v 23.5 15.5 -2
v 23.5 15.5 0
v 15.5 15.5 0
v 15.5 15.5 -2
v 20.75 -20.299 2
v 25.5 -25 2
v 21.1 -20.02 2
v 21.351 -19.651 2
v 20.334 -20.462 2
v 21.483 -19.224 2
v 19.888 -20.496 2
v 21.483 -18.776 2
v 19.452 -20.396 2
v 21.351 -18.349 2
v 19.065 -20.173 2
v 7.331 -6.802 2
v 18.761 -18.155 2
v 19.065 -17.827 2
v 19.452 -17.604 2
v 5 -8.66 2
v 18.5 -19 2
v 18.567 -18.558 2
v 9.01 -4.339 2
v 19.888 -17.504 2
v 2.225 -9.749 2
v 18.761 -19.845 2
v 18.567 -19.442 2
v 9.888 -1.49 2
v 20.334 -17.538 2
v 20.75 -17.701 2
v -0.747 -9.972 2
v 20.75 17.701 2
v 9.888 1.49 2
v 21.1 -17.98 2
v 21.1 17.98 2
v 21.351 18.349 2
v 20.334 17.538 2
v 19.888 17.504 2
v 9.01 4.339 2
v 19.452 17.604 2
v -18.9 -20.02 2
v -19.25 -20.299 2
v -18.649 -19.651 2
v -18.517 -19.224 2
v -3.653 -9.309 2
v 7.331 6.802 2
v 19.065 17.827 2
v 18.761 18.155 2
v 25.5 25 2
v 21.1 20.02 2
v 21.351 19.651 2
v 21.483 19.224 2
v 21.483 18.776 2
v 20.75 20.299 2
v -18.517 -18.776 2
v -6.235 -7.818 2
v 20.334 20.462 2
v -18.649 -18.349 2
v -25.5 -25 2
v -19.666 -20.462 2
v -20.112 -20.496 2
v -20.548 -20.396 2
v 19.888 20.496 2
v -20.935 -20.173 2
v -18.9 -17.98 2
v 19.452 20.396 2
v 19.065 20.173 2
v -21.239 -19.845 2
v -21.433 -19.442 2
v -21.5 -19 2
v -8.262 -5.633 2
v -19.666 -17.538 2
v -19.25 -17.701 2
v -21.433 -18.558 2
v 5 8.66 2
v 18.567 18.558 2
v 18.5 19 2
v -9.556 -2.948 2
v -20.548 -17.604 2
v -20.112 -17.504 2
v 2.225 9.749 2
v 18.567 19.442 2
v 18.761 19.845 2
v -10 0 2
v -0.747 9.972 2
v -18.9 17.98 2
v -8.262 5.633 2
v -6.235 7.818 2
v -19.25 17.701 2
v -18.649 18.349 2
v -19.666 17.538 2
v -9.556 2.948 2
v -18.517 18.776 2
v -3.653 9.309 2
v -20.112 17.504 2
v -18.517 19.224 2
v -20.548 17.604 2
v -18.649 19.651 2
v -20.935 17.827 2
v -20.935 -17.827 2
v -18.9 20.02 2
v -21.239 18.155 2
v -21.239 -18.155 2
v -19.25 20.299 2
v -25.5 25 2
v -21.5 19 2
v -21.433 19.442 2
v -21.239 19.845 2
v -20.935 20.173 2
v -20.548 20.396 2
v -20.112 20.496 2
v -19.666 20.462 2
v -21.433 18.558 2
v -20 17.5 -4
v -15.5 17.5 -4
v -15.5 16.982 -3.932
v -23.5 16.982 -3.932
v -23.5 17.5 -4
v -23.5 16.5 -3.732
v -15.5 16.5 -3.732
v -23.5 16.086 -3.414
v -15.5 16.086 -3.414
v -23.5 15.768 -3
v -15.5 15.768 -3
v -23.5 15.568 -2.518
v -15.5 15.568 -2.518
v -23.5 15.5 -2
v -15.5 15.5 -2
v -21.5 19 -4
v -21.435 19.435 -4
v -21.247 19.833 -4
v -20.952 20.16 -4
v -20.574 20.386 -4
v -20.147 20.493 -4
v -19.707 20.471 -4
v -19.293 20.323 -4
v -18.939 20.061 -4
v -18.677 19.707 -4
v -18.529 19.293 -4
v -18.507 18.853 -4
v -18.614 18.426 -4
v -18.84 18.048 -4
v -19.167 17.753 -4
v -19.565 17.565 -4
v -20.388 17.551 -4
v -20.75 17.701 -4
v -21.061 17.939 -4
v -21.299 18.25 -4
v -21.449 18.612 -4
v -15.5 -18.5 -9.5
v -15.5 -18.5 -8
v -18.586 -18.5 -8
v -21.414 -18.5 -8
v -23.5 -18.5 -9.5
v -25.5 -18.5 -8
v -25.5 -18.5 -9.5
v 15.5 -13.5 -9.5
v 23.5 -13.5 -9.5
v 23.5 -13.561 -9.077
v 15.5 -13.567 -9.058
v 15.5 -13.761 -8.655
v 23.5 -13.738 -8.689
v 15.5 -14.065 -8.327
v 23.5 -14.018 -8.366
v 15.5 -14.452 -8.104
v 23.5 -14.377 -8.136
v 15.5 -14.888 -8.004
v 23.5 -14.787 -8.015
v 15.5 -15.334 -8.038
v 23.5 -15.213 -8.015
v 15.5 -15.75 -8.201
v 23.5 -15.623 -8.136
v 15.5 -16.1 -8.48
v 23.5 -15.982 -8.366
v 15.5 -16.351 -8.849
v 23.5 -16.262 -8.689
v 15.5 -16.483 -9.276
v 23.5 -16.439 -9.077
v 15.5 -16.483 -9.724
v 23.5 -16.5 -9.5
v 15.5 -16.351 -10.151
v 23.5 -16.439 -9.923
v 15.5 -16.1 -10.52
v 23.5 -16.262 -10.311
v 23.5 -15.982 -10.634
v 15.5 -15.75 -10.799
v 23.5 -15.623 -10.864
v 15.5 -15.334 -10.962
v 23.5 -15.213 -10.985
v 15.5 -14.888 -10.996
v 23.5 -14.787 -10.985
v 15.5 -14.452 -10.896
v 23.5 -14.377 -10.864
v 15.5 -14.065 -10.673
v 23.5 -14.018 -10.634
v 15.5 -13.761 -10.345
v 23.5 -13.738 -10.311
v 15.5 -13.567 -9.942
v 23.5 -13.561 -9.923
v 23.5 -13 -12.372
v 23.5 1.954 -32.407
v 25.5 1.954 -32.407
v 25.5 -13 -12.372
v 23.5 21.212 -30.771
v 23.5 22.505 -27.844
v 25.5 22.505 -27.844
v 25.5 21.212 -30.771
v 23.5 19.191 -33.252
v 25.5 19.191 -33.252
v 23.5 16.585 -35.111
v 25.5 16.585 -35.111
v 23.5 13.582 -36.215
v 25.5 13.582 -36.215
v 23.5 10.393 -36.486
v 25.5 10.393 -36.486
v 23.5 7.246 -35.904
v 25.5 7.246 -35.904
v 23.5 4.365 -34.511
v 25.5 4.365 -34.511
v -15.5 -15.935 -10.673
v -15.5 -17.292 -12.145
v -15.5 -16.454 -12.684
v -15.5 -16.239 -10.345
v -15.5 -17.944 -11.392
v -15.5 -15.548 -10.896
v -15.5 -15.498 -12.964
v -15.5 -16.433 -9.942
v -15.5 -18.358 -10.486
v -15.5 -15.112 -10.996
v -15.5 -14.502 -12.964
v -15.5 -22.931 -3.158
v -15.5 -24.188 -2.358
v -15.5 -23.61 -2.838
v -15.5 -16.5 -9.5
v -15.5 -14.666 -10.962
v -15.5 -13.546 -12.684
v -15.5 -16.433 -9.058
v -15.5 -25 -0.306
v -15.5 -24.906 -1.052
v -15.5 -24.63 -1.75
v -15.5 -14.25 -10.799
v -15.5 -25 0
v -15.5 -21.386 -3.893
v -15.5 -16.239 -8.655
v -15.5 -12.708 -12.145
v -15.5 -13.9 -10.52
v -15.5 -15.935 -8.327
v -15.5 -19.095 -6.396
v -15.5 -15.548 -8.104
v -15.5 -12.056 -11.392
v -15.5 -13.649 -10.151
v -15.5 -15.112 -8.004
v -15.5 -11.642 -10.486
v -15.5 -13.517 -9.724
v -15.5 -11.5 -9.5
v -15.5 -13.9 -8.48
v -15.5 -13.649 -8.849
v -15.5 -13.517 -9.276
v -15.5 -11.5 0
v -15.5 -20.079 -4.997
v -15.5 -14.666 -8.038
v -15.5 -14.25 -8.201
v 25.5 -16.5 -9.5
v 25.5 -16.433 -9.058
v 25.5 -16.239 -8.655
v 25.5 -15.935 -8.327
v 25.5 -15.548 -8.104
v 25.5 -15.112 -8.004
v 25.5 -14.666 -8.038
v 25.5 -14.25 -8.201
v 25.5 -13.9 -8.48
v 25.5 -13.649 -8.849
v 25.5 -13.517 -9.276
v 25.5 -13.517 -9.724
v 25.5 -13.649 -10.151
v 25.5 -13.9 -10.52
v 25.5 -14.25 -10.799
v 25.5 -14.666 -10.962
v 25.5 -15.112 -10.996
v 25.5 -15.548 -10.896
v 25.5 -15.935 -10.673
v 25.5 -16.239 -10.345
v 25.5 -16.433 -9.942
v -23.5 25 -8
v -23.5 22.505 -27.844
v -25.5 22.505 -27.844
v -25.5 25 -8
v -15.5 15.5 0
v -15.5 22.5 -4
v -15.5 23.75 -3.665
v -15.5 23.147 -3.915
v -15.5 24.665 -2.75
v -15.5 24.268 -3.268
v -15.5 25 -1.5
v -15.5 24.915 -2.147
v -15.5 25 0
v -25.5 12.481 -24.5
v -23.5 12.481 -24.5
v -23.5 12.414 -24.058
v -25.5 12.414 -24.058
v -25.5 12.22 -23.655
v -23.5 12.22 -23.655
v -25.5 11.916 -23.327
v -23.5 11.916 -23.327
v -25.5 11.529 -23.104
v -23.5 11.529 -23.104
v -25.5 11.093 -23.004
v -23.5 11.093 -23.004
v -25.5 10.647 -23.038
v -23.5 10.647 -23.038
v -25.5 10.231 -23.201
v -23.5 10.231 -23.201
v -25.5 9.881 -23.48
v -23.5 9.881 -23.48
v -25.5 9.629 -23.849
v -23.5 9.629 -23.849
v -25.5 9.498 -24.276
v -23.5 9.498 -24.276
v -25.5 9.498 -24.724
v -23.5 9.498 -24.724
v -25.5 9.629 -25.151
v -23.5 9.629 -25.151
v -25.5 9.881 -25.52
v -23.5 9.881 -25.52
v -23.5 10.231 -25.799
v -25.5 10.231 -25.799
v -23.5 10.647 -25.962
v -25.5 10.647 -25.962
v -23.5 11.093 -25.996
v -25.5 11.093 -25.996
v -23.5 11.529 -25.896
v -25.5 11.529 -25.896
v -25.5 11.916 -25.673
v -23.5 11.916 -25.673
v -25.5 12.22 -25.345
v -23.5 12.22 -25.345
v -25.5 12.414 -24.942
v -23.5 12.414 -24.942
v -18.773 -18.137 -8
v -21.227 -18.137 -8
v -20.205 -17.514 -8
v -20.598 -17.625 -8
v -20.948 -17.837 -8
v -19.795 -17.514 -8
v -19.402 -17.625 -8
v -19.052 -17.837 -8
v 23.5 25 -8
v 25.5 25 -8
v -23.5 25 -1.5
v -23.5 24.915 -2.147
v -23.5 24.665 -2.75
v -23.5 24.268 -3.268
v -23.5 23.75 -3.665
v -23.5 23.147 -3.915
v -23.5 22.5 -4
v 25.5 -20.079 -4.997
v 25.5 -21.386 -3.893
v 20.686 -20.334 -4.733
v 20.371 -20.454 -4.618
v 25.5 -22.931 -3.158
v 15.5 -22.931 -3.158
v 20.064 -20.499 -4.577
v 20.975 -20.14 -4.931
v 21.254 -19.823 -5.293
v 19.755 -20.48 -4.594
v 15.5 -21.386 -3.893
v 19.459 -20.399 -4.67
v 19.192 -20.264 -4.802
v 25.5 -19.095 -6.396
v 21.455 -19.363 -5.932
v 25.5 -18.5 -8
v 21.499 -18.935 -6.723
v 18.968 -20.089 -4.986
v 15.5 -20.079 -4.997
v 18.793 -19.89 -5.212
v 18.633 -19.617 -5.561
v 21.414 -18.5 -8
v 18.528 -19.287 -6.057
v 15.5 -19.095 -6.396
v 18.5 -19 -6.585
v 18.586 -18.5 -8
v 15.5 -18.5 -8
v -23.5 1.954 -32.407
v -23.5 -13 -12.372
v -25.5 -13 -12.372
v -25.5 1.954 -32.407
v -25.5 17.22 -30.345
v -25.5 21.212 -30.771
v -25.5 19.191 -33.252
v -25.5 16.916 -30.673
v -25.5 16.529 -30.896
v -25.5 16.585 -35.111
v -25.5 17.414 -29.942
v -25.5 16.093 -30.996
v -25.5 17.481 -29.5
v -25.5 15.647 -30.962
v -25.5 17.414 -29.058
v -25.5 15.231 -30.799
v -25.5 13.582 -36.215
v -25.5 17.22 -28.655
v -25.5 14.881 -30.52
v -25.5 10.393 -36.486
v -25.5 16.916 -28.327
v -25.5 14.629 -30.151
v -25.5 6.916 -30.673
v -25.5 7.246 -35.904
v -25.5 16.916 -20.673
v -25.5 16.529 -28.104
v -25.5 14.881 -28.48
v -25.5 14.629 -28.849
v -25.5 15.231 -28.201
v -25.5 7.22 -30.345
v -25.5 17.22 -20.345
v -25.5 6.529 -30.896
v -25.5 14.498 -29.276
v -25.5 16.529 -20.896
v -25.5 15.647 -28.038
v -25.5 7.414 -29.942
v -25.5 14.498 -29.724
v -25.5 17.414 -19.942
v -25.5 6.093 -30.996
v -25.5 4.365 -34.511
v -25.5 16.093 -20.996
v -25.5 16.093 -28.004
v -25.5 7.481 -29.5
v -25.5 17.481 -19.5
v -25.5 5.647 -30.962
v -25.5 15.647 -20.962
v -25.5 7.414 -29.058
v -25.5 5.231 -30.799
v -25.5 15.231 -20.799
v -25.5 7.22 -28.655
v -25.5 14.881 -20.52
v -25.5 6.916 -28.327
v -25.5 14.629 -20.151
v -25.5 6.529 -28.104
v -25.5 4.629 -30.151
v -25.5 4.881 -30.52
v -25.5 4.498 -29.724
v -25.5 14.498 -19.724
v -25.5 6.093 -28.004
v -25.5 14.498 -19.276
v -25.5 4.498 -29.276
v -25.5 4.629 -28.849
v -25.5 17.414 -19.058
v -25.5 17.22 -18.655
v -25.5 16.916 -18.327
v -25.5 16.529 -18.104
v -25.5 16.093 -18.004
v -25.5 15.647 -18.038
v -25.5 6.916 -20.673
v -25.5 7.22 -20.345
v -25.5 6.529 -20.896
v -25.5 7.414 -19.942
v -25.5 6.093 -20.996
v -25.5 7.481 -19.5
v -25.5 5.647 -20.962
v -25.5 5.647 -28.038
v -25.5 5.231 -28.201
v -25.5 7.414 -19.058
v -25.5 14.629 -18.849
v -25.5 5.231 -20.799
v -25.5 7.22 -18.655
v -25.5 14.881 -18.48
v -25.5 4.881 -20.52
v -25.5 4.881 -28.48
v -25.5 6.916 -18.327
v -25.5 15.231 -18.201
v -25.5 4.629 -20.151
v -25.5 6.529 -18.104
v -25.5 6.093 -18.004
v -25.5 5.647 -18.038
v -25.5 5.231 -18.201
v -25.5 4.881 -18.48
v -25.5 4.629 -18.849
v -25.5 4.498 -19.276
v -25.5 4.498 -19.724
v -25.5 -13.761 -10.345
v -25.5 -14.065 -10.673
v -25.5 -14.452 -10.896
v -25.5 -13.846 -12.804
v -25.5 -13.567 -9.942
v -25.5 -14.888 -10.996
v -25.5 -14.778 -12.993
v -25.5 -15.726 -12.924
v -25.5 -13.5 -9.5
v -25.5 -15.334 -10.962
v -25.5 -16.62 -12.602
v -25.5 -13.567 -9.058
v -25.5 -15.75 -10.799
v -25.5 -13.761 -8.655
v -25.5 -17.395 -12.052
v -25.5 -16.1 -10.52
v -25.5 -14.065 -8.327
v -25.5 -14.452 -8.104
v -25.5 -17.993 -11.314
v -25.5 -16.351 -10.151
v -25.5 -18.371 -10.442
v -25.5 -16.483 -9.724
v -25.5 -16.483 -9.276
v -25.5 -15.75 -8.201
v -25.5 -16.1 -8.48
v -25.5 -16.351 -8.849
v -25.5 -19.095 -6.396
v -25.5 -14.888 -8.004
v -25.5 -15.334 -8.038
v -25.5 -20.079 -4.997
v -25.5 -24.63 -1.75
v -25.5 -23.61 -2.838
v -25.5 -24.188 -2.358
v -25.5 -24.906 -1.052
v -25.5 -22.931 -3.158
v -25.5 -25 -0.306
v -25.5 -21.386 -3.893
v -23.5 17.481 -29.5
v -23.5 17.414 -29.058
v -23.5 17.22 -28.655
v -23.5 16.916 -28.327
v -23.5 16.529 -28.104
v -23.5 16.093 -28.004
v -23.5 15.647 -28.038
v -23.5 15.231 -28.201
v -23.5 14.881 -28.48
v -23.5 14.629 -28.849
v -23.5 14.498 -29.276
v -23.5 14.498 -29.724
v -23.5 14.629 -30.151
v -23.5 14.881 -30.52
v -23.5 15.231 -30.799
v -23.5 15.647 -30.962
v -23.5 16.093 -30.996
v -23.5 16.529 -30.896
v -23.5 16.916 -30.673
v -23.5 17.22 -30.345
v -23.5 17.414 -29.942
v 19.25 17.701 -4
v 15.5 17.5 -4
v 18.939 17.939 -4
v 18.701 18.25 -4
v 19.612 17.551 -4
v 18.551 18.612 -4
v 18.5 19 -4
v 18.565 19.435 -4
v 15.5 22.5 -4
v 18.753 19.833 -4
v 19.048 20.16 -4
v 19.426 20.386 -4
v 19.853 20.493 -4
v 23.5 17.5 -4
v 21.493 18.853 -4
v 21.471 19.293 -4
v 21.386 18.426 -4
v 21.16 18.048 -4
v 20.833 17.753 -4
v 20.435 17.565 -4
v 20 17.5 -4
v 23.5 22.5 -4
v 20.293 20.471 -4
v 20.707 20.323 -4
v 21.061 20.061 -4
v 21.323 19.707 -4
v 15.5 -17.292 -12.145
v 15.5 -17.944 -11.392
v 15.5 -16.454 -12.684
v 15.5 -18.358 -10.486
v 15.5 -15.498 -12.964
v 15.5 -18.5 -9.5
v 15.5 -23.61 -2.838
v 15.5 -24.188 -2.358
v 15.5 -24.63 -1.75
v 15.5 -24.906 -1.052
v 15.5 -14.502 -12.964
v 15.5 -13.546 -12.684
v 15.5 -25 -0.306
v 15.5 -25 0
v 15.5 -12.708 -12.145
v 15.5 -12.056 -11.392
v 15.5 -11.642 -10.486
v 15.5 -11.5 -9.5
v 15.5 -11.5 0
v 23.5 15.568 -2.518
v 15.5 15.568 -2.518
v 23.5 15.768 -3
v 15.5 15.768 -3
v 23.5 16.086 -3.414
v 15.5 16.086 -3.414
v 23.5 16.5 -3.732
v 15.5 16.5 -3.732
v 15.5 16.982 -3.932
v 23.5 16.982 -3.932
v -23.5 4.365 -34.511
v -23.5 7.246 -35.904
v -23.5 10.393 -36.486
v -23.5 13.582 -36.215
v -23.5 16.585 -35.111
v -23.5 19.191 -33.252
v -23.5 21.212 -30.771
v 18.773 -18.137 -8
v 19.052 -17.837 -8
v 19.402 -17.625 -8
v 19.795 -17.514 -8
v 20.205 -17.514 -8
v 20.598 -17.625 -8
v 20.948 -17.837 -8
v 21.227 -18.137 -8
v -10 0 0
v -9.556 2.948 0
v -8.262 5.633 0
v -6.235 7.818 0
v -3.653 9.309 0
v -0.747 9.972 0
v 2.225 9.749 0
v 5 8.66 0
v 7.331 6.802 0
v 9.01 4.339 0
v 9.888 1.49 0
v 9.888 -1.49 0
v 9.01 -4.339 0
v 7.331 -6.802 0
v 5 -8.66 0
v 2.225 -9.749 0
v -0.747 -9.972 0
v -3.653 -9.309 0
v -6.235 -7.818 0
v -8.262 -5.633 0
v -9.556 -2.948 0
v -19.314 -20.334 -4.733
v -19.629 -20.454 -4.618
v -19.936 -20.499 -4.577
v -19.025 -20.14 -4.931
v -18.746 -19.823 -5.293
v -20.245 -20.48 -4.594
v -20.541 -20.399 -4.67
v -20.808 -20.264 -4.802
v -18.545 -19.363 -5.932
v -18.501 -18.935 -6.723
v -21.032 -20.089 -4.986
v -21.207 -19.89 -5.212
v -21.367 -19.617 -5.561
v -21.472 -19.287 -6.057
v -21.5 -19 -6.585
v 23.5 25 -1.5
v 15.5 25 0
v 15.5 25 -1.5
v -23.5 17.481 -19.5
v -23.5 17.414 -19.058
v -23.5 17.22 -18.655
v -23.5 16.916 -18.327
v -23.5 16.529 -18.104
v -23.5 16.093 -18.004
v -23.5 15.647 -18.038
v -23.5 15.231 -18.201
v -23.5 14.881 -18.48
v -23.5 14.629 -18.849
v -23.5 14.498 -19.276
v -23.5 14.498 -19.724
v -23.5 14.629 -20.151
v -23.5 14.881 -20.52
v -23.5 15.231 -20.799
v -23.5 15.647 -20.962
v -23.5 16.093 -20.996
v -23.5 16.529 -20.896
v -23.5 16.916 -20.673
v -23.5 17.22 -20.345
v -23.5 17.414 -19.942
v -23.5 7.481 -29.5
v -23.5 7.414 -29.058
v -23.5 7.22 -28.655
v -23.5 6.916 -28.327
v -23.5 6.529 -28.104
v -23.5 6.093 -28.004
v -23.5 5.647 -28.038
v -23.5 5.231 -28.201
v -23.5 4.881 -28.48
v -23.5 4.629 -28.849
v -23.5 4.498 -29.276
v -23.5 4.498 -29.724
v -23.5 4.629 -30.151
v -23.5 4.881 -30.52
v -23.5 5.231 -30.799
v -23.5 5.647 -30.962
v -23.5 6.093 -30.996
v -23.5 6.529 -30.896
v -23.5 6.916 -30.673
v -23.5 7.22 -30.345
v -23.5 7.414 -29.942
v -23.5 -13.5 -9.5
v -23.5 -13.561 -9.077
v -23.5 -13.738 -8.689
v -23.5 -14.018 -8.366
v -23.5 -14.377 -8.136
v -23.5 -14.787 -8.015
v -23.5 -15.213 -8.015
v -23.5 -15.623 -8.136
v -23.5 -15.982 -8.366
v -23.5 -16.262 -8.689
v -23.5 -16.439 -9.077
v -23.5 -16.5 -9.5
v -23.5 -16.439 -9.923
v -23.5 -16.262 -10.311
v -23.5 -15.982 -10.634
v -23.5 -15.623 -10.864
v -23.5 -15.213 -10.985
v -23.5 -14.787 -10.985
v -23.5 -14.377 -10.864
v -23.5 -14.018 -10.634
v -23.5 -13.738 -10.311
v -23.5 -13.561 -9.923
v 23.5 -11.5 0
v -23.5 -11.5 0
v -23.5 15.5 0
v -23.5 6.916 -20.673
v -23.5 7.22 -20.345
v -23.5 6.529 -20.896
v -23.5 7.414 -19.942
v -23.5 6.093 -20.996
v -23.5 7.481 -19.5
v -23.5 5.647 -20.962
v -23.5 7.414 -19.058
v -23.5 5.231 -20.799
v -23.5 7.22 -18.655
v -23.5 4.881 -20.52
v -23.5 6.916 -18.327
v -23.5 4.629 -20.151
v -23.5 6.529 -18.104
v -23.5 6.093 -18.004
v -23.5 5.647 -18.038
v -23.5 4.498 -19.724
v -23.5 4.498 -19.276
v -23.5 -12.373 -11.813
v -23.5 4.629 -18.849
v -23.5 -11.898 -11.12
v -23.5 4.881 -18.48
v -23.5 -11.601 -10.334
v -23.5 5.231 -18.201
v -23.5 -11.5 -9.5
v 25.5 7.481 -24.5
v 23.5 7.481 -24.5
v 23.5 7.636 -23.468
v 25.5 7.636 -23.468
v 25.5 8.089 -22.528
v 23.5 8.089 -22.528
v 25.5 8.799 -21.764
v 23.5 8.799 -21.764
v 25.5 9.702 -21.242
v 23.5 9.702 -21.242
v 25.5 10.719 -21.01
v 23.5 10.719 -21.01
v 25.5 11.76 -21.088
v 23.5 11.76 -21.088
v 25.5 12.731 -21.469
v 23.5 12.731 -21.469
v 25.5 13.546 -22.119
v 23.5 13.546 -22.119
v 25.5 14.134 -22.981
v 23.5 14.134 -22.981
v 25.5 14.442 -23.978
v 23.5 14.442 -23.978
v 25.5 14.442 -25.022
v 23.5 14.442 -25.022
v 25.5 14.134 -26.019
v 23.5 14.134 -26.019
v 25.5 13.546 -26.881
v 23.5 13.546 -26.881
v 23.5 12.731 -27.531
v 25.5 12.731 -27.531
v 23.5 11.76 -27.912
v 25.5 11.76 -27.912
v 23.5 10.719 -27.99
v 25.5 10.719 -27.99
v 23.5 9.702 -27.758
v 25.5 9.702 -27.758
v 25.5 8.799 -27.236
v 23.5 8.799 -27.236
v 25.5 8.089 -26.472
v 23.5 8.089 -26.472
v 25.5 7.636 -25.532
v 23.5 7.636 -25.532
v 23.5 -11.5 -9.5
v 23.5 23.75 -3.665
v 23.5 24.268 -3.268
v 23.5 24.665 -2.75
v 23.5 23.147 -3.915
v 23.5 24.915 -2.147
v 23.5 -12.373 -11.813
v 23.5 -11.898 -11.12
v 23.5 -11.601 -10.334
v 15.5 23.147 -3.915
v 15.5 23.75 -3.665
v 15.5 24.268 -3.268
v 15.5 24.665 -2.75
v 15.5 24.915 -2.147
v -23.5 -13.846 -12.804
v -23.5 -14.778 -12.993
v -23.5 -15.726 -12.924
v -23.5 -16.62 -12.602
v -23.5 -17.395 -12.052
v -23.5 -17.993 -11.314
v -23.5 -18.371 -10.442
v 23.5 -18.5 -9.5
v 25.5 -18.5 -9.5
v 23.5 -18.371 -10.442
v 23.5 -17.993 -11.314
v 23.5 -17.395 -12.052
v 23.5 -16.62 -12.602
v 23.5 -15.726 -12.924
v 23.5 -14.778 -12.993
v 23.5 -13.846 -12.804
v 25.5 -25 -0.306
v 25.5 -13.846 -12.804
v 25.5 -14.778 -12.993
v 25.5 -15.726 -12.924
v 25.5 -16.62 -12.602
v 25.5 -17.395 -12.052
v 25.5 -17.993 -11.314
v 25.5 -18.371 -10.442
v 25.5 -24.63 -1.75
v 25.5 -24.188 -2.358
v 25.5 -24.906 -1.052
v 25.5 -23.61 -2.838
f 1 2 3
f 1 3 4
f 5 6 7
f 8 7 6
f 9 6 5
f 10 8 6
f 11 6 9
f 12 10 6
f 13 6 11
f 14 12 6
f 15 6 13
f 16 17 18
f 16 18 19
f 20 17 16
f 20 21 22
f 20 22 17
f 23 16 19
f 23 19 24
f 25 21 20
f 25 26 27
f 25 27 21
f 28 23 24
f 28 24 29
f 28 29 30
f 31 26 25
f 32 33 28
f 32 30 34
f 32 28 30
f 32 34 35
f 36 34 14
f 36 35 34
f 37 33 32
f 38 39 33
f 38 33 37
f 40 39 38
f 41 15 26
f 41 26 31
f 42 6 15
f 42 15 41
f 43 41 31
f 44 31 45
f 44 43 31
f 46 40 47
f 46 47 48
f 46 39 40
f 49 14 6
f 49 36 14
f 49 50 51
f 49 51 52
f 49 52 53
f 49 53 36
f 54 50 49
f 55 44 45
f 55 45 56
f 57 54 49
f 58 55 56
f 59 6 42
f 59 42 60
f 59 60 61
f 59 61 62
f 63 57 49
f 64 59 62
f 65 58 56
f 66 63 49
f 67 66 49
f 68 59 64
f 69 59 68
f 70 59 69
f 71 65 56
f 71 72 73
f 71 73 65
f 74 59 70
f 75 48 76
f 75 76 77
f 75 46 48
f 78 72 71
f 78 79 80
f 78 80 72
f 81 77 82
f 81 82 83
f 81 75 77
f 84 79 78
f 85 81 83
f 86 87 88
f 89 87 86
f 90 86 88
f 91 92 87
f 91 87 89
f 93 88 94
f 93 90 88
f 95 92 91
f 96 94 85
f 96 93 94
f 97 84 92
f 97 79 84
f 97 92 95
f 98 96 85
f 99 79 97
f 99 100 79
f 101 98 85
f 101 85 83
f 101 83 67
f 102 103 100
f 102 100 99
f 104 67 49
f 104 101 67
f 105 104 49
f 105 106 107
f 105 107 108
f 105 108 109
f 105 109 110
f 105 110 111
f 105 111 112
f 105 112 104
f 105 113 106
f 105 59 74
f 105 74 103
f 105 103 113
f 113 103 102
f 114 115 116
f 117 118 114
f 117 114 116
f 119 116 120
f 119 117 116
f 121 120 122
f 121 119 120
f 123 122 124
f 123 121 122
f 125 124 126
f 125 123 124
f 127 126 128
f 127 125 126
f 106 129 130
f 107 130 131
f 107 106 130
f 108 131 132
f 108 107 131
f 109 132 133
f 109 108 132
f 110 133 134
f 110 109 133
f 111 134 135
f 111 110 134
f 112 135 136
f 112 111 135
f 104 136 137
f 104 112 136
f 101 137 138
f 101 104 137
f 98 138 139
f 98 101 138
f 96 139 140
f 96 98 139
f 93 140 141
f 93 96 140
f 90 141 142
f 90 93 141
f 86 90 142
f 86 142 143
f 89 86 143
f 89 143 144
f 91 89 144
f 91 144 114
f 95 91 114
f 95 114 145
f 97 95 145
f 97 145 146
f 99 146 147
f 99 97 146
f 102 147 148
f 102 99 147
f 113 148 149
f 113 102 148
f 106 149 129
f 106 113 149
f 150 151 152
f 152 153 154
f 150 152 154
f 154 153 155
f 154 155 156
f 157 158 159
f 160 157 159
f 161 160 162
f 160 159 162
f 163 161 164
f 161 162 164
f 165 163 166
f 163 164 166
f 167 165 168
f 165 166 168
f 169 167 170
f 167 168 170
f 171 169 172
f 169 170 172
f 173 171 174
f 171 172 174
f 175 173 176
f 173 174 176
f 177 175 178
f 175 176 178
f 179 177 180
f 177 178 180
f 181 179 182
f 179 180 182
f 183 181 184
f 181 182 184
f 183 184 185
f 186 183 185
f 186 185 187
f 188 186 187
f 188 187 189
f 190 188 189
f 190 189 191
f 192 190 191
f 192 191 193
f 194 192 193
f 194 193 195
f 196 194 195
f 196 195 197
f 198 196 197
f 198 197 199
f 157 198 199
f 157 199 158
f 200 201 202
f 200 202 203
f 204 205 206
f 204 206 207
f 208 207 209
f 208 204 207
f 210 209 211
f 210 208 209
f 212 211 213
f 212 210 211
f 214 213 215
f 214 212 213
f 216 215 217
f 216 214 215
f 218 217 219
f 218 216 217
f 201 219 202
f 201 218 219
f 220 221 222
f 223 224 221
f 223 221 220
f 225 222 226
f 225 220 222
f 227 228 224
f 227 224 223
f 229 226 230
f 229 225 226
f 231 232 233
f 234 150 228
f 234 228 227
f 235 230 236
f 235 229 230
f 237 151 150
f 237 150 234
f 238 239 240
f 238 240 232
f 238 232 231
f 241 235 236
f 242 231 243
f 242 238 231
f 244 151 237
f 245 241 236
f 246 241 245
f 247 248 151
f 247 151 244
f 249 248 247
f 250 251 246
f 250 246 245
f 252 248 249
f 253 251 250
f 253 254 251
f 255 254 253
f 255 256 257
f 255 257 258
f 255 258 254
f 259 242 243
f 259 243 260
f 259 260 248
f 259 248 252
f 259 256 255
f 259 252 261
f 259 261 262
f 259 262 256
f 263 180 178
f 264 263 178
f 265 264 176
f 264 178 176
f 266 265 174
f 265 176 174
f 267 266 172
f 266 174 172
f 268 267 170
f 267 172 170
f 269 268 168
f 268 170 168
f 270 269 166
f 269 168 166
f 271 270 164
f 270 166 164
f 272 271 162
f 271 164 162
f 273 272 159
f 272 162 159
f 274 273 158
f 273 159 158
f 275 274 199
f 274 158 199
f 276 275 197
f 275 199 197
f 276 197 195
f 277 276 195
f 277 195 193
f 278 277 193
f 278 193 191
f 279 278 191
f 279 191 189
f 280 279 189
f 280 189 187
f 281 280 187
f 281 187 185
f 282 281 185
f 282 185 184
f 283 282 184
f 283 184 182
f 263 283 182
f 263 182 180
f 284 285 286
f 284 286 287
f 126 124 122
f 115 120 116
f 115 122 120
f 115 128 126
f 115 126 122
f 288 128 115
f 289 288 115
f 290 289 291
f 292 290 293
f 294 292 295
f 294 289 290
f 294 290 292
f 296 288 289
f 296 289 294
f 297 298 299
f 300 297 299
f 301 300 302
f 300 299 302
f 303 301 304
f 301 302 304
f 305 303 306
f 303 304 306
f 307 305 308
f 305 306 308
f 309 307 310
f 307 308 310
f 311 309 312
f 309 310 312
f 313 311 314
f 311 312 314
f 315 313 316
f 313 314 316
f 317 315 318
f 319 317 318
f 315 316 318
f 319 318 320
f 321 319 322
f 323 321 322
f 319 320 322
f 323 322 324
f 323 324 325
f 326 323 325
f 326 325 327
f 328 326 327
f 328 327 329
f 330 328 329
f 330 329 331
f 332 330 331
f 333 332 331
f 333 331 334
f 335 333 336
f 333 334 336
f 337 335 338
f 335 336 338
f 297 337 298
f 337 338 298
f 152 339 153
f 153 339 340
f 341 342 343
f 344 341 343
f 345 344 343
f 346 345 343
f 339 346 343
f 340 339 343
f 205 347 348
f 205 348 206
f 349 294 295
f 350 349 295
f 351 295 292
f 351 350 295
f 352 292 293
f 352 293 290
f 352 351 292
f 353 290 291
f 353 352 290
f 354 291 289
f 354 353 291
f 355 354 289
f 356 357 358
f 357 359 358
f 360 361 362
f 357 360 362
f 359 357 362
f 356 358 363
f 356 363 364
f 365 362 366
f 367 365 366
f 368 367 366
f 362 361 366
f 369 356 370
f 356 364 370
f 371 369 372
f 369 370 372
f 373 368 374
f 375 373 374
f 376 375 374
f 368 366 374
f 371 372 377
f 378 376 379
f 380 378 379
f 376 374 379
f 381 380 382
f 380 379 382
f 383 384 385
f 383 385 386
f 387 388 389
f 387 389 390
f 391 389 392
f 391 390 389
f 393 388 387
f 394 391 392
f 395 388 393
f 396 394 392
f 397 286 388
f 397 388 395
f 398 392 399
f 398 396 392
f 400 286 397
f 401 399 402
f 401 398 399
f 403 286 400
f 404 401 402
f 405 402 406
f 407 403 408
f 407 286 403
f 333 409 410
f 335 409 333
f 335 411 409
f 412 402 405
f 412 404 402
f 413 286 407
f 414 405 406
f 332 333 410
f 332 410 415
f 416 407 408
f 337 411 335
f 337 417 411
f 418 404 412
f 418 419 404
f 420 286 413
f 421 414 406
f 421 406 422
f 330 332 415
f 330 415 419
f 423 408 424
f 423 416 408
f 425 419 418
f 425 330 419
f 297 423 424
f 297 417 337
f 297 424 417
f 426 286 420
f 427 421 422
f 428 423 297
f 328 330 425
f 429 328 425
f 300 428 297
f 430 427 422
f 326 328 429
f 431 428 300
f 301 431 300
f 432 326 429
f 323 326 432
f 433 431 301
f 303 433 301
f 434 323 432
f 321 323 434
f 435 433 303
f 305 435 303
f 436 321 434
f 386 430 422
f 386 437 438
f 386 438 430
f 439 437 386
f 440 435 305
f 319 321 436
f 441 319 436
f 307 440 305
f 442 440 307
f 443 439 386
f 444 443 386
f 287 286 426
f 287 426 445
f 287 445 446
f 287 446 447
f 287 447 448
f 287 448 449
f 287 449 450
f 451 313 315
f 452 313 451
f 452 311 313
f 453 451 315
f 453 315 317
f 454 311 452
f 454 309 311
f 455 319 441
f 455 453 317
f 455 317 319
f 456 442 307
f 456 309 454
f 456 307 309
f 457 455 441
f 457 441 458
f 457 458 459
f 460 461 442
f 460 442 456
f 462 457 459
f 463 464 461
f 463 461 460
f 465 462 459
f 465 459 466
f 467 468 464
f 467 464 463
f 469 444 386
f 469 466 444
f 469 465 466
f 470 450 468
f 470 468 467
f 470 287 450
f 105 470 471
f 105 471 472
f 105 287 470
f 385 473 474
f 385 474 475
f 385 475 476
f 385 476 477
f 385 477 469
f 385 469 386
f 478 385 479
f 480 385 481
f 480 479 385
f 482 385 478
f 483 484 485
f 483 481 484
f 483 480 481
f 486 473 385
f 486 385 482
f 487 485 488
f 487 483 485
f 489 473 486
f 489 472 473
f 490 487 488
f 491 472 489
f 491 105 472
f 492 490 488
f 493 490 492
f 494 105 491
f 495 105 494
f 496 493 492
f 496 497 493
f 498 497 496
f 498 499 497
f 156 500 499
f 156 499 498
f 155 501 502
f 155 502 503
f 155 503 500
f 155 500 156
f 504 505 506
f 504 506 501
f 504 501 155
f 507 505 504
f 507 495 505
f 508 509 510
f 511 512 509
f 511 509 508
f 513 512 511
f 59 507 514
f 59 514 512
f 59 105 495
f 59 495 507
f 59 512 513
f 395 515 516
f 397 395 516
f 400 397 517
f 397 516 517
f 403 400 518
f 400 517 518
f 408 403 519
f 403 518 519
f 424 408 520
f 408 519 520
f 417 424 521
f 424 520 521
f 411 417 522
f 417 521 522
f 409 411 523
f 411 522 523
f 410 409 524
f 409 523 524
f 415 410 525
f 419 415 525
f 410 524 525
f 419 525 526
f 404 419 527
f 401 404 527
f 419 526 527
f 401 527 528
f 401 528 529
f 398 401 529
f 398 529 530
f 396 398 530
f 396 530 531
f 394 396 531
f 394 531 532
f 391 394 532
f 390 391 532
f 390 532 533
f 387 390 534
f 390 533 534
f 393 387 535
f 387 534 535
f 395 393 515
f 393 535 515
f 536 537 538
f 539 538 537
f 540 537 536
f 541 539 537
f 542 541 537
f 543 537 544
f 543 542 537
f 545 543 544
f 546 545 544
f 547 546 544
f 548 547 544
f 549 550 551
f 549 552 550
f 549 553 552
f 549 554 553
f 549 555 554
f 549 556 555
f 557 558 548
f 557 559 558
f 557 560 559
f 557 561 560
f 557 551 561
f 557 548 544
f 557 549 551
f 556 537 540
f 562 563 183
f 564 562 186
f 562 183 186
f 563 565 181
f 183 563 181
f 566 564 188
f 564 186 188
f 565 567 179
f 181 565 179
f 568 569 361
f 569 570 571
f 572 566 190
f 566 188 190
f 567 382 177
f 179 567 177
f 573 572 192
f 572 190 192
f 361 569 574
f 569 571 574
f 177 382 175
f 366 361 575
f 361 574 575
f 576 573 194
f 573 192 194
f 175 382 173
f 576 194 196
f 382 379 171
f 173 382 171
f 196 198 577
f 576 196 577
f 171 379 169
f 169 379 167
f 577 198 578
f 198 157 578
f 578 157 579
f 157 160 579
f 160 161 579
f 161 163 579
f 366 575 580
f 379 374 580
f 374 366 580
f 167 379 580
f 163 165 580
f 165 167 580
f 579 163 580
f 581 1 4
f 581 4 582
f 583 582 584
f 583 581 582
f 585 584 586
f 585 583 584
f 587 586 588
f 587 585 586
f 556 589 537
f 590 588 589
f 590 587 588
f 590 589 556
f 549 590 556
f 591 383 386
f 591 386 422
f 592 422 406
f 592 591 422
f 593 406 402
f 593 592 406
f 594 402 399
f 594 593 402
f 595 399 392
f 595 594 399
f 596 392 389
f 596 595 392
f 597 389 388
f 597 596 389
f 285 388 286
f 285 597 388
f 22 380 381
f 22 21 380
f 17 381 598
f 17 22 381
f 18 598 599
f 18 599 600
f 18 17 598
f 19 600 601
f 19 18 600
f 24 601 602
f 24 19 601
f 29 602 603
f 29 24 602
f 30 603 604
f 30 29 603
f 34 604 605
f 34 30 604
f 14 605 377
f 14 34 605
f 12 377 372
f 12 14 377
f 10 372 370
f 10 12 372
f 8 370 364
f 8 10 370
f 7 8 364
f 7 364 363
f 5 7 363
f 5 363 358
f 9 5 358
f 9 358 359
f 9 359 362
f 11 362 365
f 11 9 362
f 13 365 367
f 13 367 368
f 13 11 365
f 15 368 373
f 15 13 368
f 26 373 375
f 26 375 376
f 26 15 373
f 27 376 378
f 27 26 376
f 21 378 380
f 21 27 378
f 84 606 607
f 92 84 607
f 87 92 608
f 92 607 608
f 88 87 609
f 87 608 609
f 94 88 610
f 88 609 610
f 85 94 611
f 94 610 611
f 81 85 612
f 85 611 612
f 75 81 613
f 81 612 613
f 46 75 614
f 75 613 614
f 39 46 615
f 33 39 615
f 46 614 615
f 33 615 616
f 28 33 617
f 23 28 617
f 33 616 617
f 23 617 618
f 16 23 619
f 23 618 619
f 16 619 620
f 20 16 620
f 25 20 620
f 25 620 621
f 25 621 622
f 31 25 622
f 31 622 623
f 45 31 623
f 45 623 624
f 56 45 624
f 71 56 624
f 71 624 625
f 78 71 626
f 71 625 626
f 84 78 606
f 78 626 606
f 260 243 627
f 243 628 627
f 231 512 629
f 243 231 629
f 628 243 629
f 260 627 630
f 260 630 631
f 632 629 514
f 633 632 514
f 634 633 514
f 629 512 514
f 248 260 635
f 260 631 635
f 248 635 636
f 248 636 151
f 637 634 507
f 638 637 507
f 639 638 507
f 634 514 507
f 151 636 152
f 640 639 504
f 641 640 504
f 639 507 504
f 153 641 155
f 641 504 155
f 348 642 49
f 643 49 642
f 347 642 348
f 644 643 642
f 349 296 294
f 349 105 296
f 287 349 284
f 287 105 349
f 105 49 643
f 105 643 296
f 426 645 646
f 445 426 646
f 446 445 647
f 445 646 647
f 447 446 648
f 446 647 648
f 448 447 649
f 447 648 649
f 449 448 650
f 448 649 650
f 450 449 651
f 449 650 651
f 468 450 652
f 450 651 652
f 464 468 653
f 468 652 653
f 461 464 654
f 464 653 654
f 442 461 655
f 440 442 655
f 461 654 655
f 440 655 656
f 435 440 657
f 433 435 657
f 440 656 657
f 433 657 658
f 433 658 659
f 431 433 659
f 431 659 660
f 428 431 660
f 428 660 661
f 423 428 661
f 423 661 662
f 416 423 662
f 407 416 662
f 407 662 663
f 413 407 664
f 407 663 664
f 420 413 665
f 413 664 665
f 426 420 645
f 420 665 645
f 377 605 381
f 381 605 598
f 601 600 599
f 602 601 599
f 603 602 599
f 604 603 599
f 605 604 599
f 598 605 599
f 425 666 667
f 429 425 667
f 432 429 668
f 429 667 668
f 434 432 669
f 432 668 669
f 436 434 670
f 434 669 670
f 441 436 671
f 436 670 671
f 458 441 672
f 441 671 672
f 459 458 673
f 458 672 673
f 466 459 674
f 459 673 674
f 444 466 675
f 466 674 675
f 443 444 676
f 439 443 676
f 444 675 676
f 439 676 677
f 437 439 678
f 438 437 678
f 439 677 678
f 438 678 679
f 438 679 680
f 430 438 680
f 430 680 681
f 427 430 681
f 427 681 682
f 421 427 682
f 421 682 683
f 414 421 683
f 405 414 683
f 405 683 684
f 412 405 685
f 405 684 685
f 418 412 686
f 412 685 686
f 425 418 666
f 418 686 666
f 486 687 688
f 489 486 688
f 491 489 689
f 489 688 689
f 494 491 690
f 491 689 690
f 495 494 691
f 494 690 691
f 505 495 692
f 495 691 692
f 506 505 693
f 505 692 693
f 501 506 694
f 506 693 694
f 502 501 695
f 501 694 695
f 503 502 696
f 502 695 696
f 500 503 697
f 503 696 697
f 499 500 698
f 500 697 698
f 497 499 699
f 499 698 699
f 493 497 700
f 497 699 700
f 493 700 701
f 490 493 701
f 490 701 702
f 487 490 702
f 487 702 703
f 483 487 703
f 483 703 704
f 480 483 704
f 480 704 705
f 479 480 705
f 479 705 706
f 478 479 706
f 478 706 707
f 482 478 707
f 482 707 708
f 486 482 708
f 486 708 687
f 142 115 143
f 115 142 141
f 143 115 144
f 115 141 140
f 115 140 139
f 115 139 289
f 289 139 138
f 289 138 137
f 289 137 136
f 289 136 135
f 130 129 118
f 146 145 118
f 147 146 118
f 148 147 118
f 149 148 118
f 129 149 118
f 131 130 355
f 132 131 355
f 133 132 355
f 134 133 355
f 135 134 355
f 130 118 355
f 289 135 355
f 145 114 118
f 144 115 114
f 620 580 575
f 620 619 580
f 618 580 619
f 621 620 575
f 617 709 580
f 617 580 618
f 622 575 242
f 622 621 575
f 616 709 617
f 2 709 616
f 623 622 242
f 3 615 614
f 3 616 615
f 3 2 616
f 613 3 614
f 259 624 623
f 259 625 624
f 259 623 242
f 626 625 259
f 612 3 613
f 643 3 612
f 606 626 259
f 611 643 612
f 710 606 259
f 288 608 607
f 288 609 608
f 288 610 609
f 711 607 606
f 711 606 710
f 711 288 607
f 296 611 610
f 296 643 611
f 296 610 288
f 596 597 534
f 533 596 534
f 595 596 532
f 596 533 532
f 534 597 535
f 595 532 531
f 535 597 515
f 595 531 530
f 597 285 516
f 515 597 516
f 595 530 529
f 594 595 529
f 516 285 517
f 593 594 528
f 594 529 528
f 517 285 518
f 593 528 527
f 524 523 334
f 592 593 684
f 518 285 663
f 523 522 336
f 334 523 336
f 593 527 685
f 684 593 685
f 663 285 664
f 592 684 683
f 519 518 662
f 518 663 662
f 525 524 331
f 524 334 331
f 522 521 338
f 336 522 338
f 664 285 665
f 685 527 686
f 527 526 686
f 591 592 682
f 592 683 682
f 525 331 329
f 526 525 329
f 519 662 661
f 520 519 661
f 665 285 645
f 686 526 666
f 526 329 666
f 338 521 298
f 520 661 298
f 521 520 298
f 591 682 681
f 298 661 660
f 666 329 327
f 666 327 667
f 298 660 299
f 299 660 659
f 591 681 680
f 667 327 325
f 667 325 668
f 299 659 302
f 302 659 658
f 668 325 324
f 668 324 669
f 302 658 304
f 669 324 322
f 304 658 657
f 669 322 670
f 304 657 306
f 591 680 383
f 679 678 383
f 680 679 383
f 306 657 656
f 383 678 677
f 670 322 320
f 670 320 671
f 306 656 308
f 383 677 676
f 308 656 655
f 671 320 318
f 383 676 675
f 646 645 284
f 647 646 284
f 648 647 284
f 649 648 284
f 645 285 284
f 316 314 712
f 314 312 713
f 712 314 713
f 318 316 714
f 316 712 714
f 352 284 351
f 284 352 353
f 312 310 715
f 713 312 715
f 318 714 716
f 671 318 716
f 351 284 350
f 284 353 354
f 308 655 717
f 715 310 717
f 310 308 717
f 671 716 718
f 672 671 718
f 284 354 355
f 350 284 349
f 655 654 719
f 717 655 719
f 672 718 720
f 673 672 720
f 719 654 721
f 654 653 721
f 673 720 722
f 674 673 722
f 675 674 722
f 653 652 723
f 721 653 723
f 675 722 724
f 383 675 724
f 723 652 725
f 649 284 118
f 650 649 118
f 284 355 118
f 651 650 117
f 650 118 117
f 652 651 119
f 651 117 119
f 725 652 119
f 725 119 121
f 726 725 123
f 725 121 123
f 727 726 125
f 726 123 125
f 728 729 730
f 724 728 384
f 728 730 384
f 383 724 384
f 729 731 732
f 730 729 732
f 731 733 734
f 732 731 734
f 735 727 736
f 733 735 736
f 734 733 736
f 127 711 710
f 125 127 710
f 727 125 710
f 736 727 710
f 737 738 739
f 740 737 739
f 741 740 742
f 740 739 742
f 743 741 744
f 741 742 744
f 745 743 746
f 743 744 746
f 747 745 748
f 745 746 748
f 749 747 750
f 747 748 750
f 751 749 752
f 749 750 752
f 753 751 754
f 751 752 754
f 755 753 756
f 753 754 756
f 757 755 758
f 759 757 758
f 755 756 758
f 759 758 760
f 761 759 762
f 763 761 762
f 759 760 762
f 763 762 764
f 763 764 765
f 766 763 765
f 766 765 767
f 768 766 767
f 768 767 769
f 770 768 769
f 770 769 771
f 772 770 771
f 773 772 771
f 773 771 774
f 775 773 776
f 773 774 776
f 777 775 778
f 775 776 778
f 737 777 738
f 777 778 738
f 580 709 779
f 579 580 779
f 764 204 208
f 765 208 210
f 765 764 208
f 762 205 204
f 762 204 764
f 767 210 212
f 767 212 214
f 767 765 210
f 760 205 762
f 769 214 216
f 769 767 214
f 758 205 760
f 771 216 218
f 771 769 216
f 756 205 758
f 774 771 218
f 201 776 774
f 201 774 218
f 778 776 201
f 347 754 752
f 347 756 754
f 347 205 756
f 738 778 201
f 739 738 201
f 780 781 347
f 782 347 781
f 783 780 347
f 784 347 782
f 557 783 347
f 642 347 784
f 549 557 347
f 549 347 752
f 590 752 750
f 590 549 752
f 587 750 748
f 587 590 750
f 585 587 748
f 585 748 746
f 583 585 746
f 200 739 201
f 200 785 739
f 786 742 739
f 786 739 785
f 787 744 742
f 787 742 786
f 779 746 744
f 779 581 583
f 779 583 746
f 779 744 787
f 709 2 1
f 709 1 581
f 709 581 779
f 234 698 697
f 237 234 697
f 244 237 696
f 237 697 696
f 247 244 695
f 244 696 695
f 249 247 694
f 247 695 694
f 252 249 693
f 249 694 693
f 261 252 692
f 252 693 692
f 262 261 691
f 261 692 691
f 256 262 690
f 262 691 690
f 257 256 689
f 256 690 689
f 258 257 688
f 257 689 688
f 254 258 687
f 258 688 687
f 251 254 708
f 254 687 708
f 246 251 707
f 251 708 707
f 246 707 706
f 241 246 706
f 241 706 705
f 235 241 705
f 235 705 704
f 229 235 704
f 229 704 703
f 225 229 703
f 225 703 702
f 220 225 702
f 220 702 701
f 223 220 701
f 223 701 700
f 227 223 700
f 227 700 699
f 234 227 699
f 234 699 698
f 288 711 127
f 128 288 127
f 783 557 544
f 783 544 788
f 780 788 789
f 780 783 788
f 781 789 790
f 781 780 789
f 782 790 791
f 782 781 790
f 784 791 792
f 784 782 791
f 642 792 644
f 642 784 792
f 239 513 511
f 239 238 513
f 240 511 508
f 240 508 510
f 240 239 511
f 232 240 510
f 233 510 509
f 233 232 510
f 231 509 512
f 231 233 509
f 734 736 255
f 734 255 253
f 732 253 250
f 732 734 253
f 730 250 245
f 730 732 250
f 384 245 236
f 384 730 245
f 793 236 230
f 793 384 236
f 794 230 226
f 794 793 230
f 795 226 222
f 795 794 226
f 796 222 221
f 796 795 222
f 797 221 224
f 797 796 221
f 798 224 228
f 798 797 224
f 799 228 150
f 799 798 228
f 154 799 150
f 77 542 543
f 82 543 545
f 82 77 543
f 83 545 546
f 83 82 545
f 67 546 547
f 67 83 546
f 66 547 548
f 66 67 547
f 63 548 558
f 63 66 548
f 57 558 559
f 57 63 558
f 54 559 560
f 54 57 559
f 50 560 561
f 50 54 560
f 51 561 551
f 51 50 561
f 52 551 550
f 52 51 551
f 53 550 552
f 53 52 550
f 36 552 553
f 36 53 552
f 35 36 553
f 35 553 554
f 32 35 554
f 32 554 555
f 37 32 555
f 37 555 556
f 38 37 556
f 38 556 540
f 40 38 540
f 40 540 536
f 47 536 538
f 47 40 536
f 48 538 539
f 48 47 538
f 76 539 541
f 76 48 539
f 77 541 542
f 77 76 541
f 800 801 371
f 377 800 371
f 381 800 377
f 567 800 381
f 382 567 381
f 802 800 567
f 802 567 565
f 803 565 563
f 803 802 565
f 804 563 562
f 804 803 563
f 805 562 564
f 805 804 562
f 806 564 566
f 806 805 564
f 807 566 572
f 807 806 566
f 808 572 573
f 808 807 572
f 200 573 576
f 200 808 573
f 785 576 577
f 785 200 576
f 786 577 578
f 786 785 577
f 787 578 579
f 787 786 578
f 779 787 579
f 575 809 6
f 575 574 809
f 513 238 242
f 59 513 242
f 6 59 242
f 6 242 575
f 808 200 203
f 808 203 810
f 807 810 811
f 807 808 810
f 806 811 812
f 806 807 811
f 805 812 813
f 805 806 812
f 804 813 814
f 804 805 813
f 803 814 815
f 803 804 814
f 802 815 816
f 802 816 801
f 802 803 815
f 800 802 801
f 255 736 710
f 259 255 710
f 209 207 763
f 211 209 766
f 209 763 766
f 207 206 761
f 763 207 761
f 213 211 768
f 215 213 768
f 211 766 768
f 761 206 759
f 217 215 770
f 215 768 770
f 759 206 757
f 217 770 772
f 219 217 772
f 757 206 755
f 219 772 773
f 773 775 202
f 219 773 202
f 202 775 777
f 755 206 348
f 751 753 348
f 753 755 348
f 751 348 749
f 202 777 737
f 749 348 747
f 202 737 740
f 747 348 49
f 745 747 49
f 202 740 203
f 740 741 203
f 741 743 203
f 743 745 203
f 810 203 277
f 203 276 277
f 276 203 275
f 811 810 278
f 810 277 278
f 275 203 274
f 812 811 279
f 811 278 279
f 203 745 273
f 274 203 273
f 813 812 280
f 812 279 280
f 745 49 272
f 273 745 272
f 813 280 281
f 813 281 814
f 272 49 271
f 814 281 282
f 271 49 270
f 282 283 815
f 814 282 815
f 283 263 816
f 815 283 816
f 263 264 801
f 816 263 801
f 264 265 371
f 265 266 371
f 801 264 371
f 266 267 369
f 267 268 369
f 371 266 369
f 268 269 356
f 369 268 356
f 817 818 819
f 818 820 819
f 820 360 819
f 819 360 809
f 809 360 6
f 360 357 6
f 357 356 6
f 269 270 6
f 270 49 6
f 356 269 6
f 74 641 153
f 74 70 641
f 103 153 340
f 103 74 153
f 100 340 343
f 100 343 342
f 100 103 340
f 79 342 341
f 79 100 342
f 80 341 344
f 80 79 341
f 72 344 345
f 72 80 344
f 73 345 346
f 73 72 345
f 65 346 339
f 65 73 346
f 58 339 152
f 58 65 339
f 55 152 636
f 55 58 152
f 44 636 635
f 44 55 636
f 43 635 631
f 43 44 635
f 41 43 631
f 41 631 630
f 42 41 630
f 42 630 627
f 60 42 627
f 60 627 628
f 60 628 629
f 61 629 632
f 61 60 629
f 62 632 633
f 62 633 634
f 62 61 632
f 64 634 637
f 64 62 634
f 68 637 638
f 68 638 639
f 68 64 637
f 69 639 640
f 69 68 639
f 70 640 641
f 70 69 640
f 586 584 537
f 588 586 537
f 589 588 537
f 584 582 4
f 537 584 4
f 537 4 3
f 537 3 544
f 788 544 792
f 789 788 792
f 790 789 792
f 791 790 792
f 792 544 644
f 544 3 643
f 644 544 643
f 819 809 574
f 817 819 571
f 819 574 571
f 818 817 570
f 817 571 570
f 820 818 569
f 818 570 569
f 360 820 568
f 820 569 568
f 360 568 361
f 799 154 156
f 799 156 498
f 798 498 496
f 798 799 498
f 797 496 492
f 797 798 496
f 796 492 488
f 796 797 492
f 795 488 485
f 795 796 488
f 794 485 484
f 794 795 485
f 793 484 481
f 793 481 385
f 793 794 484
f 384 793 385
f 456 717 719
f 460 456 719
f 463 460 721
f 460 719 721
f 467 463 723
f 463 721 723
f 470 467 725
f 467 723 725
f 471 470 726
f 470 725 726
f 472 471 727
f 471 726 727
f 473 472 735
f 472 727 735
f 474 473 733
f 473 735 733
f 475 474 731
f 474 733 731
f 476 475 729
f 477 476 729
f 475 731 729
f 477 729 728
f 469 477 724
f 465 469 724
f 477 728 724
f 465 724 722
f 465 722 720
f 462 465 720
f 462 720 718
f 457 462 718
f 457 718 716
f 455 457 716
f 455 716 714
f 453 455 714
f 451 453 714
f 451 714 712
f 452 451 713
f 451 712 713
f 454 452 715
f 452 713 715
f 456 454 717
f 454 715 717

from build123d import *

# Parameters (mm, degrees)
SKETCH_W        = 47
SKETCH_H        = 50
SKETCH_R        = 10
SKETCH_R_2      = 1.5
PAD_DEPTH       = 2
SKETCH001_R     = 1.5
PAD001_DEPTH    = 2
SKETCH002_R     = 1.5
PAD002_DEPTH    = 8
SKETCH004_R     = 1.5
POCKET_DEPTH    = 8
PAD003_DEPTH    = 8
SKETCH005_R     = 1.5
POCKET001_DEPTH = 4
SKETCH006_R     = 1.5
SKETCH006_R_2   = 3.5
PAD004_DEPTH    = 2
SKETCH007_R     = 1.5
PAD005_DEPTH    = 8
SKETCH008_R     = 1.5
POCKET002_DEPTH = 8
PAD006_DEPTH    = 8
SKETCH010_R     = 1.5
POCKET003_DEPTH = 4
FILLET_R        = 3


with BuildPart() as body:
    # Sketch → Pad (new body)
    with BuildSketch(Plane.XY):
        Rectangle(SKETCH_W, SKETCH_H)
        Circle(SKETCH_R, mode=Mode.SUBTRACT)
        with Locations((-20, -19)):
            Circle(SKETCH_R_2, mode=Mode.SUBTRACT)
        with Locations((20, -19)):
            Circle(SKETCH_R_2, mode=Mode.SUBTRACT)
        with Locations((-20, 19)):
            Circle(SKETCH_R_2, mode=Mode.SUBTRACT)
        with Locations((20, 19)):
            Circle(SKETCH_R_2, mode=Mode.SUBTRACT)
    extrude(amount=PAD_DEPTH)

    # Sketch001 (on Face2 of Pad) → Pad001 (join)
    with BuildSketch(Plane.YZ.offset(23.5)):
        with BuildLine():
            Line((-25, 2), (25, 2))
            Line((25, -8), (25, 2))
            Line((22.505468, -27.843823), (25, -8))
            ThreePointArc((1.953944, -32.406741), (13.581707, -36.214738), (22.505468, -27.843823))
            Line((-13, -12.372281), (1.953944, -32.406741))
            ThreePointArc((-18.5, -9.5), (-16.620185, -12.602418), (-13, -12.372281))
            Line((-18.5, -8), (-18.5, -9.5))
            ThreePointArc((-18.5, -8), (-20.847064, -4.279548), (-25, -2.829168))
            Line((-25, 2), (-25, -2.829168))
        make_face()
        with Locations((-15, -9.5)):
            Circle(SKETCH001_R, mode=Mode.SUBTRACT)
        with Locations((15.980762, -19.5)):
            Circle(SKETCH001_R, mode=Mode.SUBTRACT)
        with Locations((5.980762, -19.5)):
            Circle(SKETCH001_R, mode=Mode.SUBTRACT)
        with Locations((10.980762, -24.5)):
            Circle(SKETCH001_R, mode=Mode.SUBTRACT)
        with Locations((15.980762, -29.5)):
            Circle(SKETCH001_R, mode=Mode.SUBTRACT)
        with Locations((5.980762, -29.5)):
            Circle(SKETCH001_R, mode=Mode.SUBTRACT)
    extrude(amount=PAD001_DEPTH)

    # Sketch002 (on Face9 of Pad001) → Pad002 (join)
    with BuildSketch(Plane(origin=(23.5, 0, 0), x_dir=(0, -1, 0), z_dir=(-1, 0, 0))):
        with BuildLine():
            Line((18.5, -8), (18.5, -9.5))
            ThreePointArc((11.5, -9.5), (15, -13), (18.5, -9.5))
            Line((11.5, -9.5), (11.5, 0))
            Line((25, 0), (11.5, 0))
            Line((25, 0), (25, -2.829168))
            ThreePointArc((25, -2.829168), (20.847064, -4.279548), (18.5, -8))
        make_face()
        with Locations((15, -9.5)):
            Circle(SKETCH002_R, mode=Mode.SUBTRACT)
    extrude(amount=PAD002_DEPTH)

    # Sketch004 (on Face35 of Pad002) → Pocket (cut)
    with BuildSketch(Plane.XY):
        with Locations((20, -19)):
            Circle(SKETCH004_R)
    extrude(amount=-POCKET_DEPTH, mode=Mode.SUBTRACT)

    # Sketch003 (on Face9 of Pad002) → Pad003 (join)
    with BuildSketch(Plane(origin=(23.5, 0, 0), x_dir=(0, -1, 0), z_dir=(-1, 0, 0))):
        with BuildLine():
            Line((-25, 0), (-15.5, 0))
            Line((-15.5, 0), (-15.5, -2))
            ThreePointArc((-17.5, -4), (-16.085786, -3.414214), (-15.5, -2))
            Line((-17.5, -4), (-22.5, -4))
            ThreePointArc((-25, -1.5), (-24.267767, -3.267767), (-22.5, -4))
            Line((-25, 0), (-25, -1.5))
        make_face()
    extrude(amount=PAD003_DEPTH)

    # Sketch005 (on Face41 of Pad003) → Pocket001 (cut)
    with BuildSketch(Plane.XY):
        with Locations((20, 19)):
            Circle(SKETCH005_R)
    extrude(amount=-POCKET001_DEPTH, mode=Mode.SUBTRACT)

    # Sketch006 (on Face2 of Pocket001) → Pad004 (join)
    with BuildSketch(Plane(origin=(-23.5, 0, 0), x_dir=(0, -1, 0), z_dir=(-1, 0, 0))):
        with BuildLine():
            Line((25, 2), (-25, 2))
            Line((-25, 2), (-25, -8))
            Line((-25, -8), (-22.505468, -27.843823))
            ThreePointArc((-22.505468, -27.843823), (-13.581707, -36.214738), (-1.953944, -32.406741))
            Line((-1.953944, -32.406741), (13, -12.372281))
            ThreePointArc((13, -12.372281), (16.620185, -12.602418), (18.5, -9.5))
            Line((18.5, -9.5), (18.5, -8))
            ThreePointArc((25, -2.829168), (20.847064, -4.279548), (18.5, -8))
            Line((25, -2.829168), (25, 2))
        make_face()
        with Locations((15, -9.5)):
            Circle(SKETCH006_R, mode=Mode.SUBTRACT)
        with Locations((-10.980762, -24.5)):
            Circle(SKETCH006_R_2, mode=Mode.SUBTRACT)
    extrude(amount=PAD004_DEPTH)

    # Sketch007 (on Face9 of Pad004) → Pad005 (join)
    with BuildSketch(Plane.YZ.offset(-23.5)):
        with BuildLine():
            Line((-11.5, 0), (-25, 0))
            Line((-25, 0), (-25, -2.829168))
            ThreePointArc((-18.5, -8), (-20.847064, -4.279548), (-25, -2.829168))
            Line((-18.5, -8), (-18.5, -9.5))
            ThreePointArc((-18.5, -9.5), (-15, -13), (-11.5, -9.5))
            Line((-11.5, 0), (-11.5, -9.5))
        make_face()
        with Locations((-15, -9.5)):
            Circle(SKETCH007_R, mode=Mode.SUBTRACT)
    extrude(amount=PAD005_DEPTH)

    # Sketch008 (on Face62 of Pad005) → Pocket002 (cut)
    with BuildSketch(Plane.XY):
        with Locations((-20, -19)):
            Circle(SKETCH008_R)
    extrude(amount=-POCKET002_DEPTH, mode=Mode.SUBTRACT)

    # Sketch009 (on Face9 of Pocket002) → Pad006 (join)
    with BuildSketch(Plane.YZ.offset(-23.5)):
        with BuildLine():
            Line((25, 0), (15.5, 0))
            Line((15.5, 0), (15.5, -2))
            ThreePointArc((15.5, -2), (16.085786, -3.414214), (17.5, -4))
            Line((17.5, -4), (22.5, -4))
            ThreePointArc((22.5, -4), (24.267767, -3.267767), (25, -1.5))
            Line((25, -1.5), (25, 0))
        make_face()
    extrude(amount=PAD006_DEPTH)

    # Sketch010 (on Face67 of Pad006) → Pocket003 (cut)
    with BuildSketch(Plane.XY):
        with Locations((-20, 19)):
            Circle(SKETCH010_R)
    extrude(amount=-POCKET003_DEPTH, mode=Mode.SUBTRACT)

    # Fillet
    fillet_edges = [body.edges().sort_by_distance(p)[0] for p in [
        (-19.5, -25, -2.829168),
        (-24.5, -25, -2.829168),
        (19.5, -25, -2.829168),
        (24.5, -25, -2.829168),
    ]]
    fillet(fillet_edges, radius=FILLET_R)


with BuildPart() as part_mirroring:
    # Part__Mirroring: instance of Body
    add(body.part.mirror(Plane(origin=(0, 0, 0), x_dir=(0, -1, 0), z_dir=(1, 0, 0))))


solid = part_mirroring.part
